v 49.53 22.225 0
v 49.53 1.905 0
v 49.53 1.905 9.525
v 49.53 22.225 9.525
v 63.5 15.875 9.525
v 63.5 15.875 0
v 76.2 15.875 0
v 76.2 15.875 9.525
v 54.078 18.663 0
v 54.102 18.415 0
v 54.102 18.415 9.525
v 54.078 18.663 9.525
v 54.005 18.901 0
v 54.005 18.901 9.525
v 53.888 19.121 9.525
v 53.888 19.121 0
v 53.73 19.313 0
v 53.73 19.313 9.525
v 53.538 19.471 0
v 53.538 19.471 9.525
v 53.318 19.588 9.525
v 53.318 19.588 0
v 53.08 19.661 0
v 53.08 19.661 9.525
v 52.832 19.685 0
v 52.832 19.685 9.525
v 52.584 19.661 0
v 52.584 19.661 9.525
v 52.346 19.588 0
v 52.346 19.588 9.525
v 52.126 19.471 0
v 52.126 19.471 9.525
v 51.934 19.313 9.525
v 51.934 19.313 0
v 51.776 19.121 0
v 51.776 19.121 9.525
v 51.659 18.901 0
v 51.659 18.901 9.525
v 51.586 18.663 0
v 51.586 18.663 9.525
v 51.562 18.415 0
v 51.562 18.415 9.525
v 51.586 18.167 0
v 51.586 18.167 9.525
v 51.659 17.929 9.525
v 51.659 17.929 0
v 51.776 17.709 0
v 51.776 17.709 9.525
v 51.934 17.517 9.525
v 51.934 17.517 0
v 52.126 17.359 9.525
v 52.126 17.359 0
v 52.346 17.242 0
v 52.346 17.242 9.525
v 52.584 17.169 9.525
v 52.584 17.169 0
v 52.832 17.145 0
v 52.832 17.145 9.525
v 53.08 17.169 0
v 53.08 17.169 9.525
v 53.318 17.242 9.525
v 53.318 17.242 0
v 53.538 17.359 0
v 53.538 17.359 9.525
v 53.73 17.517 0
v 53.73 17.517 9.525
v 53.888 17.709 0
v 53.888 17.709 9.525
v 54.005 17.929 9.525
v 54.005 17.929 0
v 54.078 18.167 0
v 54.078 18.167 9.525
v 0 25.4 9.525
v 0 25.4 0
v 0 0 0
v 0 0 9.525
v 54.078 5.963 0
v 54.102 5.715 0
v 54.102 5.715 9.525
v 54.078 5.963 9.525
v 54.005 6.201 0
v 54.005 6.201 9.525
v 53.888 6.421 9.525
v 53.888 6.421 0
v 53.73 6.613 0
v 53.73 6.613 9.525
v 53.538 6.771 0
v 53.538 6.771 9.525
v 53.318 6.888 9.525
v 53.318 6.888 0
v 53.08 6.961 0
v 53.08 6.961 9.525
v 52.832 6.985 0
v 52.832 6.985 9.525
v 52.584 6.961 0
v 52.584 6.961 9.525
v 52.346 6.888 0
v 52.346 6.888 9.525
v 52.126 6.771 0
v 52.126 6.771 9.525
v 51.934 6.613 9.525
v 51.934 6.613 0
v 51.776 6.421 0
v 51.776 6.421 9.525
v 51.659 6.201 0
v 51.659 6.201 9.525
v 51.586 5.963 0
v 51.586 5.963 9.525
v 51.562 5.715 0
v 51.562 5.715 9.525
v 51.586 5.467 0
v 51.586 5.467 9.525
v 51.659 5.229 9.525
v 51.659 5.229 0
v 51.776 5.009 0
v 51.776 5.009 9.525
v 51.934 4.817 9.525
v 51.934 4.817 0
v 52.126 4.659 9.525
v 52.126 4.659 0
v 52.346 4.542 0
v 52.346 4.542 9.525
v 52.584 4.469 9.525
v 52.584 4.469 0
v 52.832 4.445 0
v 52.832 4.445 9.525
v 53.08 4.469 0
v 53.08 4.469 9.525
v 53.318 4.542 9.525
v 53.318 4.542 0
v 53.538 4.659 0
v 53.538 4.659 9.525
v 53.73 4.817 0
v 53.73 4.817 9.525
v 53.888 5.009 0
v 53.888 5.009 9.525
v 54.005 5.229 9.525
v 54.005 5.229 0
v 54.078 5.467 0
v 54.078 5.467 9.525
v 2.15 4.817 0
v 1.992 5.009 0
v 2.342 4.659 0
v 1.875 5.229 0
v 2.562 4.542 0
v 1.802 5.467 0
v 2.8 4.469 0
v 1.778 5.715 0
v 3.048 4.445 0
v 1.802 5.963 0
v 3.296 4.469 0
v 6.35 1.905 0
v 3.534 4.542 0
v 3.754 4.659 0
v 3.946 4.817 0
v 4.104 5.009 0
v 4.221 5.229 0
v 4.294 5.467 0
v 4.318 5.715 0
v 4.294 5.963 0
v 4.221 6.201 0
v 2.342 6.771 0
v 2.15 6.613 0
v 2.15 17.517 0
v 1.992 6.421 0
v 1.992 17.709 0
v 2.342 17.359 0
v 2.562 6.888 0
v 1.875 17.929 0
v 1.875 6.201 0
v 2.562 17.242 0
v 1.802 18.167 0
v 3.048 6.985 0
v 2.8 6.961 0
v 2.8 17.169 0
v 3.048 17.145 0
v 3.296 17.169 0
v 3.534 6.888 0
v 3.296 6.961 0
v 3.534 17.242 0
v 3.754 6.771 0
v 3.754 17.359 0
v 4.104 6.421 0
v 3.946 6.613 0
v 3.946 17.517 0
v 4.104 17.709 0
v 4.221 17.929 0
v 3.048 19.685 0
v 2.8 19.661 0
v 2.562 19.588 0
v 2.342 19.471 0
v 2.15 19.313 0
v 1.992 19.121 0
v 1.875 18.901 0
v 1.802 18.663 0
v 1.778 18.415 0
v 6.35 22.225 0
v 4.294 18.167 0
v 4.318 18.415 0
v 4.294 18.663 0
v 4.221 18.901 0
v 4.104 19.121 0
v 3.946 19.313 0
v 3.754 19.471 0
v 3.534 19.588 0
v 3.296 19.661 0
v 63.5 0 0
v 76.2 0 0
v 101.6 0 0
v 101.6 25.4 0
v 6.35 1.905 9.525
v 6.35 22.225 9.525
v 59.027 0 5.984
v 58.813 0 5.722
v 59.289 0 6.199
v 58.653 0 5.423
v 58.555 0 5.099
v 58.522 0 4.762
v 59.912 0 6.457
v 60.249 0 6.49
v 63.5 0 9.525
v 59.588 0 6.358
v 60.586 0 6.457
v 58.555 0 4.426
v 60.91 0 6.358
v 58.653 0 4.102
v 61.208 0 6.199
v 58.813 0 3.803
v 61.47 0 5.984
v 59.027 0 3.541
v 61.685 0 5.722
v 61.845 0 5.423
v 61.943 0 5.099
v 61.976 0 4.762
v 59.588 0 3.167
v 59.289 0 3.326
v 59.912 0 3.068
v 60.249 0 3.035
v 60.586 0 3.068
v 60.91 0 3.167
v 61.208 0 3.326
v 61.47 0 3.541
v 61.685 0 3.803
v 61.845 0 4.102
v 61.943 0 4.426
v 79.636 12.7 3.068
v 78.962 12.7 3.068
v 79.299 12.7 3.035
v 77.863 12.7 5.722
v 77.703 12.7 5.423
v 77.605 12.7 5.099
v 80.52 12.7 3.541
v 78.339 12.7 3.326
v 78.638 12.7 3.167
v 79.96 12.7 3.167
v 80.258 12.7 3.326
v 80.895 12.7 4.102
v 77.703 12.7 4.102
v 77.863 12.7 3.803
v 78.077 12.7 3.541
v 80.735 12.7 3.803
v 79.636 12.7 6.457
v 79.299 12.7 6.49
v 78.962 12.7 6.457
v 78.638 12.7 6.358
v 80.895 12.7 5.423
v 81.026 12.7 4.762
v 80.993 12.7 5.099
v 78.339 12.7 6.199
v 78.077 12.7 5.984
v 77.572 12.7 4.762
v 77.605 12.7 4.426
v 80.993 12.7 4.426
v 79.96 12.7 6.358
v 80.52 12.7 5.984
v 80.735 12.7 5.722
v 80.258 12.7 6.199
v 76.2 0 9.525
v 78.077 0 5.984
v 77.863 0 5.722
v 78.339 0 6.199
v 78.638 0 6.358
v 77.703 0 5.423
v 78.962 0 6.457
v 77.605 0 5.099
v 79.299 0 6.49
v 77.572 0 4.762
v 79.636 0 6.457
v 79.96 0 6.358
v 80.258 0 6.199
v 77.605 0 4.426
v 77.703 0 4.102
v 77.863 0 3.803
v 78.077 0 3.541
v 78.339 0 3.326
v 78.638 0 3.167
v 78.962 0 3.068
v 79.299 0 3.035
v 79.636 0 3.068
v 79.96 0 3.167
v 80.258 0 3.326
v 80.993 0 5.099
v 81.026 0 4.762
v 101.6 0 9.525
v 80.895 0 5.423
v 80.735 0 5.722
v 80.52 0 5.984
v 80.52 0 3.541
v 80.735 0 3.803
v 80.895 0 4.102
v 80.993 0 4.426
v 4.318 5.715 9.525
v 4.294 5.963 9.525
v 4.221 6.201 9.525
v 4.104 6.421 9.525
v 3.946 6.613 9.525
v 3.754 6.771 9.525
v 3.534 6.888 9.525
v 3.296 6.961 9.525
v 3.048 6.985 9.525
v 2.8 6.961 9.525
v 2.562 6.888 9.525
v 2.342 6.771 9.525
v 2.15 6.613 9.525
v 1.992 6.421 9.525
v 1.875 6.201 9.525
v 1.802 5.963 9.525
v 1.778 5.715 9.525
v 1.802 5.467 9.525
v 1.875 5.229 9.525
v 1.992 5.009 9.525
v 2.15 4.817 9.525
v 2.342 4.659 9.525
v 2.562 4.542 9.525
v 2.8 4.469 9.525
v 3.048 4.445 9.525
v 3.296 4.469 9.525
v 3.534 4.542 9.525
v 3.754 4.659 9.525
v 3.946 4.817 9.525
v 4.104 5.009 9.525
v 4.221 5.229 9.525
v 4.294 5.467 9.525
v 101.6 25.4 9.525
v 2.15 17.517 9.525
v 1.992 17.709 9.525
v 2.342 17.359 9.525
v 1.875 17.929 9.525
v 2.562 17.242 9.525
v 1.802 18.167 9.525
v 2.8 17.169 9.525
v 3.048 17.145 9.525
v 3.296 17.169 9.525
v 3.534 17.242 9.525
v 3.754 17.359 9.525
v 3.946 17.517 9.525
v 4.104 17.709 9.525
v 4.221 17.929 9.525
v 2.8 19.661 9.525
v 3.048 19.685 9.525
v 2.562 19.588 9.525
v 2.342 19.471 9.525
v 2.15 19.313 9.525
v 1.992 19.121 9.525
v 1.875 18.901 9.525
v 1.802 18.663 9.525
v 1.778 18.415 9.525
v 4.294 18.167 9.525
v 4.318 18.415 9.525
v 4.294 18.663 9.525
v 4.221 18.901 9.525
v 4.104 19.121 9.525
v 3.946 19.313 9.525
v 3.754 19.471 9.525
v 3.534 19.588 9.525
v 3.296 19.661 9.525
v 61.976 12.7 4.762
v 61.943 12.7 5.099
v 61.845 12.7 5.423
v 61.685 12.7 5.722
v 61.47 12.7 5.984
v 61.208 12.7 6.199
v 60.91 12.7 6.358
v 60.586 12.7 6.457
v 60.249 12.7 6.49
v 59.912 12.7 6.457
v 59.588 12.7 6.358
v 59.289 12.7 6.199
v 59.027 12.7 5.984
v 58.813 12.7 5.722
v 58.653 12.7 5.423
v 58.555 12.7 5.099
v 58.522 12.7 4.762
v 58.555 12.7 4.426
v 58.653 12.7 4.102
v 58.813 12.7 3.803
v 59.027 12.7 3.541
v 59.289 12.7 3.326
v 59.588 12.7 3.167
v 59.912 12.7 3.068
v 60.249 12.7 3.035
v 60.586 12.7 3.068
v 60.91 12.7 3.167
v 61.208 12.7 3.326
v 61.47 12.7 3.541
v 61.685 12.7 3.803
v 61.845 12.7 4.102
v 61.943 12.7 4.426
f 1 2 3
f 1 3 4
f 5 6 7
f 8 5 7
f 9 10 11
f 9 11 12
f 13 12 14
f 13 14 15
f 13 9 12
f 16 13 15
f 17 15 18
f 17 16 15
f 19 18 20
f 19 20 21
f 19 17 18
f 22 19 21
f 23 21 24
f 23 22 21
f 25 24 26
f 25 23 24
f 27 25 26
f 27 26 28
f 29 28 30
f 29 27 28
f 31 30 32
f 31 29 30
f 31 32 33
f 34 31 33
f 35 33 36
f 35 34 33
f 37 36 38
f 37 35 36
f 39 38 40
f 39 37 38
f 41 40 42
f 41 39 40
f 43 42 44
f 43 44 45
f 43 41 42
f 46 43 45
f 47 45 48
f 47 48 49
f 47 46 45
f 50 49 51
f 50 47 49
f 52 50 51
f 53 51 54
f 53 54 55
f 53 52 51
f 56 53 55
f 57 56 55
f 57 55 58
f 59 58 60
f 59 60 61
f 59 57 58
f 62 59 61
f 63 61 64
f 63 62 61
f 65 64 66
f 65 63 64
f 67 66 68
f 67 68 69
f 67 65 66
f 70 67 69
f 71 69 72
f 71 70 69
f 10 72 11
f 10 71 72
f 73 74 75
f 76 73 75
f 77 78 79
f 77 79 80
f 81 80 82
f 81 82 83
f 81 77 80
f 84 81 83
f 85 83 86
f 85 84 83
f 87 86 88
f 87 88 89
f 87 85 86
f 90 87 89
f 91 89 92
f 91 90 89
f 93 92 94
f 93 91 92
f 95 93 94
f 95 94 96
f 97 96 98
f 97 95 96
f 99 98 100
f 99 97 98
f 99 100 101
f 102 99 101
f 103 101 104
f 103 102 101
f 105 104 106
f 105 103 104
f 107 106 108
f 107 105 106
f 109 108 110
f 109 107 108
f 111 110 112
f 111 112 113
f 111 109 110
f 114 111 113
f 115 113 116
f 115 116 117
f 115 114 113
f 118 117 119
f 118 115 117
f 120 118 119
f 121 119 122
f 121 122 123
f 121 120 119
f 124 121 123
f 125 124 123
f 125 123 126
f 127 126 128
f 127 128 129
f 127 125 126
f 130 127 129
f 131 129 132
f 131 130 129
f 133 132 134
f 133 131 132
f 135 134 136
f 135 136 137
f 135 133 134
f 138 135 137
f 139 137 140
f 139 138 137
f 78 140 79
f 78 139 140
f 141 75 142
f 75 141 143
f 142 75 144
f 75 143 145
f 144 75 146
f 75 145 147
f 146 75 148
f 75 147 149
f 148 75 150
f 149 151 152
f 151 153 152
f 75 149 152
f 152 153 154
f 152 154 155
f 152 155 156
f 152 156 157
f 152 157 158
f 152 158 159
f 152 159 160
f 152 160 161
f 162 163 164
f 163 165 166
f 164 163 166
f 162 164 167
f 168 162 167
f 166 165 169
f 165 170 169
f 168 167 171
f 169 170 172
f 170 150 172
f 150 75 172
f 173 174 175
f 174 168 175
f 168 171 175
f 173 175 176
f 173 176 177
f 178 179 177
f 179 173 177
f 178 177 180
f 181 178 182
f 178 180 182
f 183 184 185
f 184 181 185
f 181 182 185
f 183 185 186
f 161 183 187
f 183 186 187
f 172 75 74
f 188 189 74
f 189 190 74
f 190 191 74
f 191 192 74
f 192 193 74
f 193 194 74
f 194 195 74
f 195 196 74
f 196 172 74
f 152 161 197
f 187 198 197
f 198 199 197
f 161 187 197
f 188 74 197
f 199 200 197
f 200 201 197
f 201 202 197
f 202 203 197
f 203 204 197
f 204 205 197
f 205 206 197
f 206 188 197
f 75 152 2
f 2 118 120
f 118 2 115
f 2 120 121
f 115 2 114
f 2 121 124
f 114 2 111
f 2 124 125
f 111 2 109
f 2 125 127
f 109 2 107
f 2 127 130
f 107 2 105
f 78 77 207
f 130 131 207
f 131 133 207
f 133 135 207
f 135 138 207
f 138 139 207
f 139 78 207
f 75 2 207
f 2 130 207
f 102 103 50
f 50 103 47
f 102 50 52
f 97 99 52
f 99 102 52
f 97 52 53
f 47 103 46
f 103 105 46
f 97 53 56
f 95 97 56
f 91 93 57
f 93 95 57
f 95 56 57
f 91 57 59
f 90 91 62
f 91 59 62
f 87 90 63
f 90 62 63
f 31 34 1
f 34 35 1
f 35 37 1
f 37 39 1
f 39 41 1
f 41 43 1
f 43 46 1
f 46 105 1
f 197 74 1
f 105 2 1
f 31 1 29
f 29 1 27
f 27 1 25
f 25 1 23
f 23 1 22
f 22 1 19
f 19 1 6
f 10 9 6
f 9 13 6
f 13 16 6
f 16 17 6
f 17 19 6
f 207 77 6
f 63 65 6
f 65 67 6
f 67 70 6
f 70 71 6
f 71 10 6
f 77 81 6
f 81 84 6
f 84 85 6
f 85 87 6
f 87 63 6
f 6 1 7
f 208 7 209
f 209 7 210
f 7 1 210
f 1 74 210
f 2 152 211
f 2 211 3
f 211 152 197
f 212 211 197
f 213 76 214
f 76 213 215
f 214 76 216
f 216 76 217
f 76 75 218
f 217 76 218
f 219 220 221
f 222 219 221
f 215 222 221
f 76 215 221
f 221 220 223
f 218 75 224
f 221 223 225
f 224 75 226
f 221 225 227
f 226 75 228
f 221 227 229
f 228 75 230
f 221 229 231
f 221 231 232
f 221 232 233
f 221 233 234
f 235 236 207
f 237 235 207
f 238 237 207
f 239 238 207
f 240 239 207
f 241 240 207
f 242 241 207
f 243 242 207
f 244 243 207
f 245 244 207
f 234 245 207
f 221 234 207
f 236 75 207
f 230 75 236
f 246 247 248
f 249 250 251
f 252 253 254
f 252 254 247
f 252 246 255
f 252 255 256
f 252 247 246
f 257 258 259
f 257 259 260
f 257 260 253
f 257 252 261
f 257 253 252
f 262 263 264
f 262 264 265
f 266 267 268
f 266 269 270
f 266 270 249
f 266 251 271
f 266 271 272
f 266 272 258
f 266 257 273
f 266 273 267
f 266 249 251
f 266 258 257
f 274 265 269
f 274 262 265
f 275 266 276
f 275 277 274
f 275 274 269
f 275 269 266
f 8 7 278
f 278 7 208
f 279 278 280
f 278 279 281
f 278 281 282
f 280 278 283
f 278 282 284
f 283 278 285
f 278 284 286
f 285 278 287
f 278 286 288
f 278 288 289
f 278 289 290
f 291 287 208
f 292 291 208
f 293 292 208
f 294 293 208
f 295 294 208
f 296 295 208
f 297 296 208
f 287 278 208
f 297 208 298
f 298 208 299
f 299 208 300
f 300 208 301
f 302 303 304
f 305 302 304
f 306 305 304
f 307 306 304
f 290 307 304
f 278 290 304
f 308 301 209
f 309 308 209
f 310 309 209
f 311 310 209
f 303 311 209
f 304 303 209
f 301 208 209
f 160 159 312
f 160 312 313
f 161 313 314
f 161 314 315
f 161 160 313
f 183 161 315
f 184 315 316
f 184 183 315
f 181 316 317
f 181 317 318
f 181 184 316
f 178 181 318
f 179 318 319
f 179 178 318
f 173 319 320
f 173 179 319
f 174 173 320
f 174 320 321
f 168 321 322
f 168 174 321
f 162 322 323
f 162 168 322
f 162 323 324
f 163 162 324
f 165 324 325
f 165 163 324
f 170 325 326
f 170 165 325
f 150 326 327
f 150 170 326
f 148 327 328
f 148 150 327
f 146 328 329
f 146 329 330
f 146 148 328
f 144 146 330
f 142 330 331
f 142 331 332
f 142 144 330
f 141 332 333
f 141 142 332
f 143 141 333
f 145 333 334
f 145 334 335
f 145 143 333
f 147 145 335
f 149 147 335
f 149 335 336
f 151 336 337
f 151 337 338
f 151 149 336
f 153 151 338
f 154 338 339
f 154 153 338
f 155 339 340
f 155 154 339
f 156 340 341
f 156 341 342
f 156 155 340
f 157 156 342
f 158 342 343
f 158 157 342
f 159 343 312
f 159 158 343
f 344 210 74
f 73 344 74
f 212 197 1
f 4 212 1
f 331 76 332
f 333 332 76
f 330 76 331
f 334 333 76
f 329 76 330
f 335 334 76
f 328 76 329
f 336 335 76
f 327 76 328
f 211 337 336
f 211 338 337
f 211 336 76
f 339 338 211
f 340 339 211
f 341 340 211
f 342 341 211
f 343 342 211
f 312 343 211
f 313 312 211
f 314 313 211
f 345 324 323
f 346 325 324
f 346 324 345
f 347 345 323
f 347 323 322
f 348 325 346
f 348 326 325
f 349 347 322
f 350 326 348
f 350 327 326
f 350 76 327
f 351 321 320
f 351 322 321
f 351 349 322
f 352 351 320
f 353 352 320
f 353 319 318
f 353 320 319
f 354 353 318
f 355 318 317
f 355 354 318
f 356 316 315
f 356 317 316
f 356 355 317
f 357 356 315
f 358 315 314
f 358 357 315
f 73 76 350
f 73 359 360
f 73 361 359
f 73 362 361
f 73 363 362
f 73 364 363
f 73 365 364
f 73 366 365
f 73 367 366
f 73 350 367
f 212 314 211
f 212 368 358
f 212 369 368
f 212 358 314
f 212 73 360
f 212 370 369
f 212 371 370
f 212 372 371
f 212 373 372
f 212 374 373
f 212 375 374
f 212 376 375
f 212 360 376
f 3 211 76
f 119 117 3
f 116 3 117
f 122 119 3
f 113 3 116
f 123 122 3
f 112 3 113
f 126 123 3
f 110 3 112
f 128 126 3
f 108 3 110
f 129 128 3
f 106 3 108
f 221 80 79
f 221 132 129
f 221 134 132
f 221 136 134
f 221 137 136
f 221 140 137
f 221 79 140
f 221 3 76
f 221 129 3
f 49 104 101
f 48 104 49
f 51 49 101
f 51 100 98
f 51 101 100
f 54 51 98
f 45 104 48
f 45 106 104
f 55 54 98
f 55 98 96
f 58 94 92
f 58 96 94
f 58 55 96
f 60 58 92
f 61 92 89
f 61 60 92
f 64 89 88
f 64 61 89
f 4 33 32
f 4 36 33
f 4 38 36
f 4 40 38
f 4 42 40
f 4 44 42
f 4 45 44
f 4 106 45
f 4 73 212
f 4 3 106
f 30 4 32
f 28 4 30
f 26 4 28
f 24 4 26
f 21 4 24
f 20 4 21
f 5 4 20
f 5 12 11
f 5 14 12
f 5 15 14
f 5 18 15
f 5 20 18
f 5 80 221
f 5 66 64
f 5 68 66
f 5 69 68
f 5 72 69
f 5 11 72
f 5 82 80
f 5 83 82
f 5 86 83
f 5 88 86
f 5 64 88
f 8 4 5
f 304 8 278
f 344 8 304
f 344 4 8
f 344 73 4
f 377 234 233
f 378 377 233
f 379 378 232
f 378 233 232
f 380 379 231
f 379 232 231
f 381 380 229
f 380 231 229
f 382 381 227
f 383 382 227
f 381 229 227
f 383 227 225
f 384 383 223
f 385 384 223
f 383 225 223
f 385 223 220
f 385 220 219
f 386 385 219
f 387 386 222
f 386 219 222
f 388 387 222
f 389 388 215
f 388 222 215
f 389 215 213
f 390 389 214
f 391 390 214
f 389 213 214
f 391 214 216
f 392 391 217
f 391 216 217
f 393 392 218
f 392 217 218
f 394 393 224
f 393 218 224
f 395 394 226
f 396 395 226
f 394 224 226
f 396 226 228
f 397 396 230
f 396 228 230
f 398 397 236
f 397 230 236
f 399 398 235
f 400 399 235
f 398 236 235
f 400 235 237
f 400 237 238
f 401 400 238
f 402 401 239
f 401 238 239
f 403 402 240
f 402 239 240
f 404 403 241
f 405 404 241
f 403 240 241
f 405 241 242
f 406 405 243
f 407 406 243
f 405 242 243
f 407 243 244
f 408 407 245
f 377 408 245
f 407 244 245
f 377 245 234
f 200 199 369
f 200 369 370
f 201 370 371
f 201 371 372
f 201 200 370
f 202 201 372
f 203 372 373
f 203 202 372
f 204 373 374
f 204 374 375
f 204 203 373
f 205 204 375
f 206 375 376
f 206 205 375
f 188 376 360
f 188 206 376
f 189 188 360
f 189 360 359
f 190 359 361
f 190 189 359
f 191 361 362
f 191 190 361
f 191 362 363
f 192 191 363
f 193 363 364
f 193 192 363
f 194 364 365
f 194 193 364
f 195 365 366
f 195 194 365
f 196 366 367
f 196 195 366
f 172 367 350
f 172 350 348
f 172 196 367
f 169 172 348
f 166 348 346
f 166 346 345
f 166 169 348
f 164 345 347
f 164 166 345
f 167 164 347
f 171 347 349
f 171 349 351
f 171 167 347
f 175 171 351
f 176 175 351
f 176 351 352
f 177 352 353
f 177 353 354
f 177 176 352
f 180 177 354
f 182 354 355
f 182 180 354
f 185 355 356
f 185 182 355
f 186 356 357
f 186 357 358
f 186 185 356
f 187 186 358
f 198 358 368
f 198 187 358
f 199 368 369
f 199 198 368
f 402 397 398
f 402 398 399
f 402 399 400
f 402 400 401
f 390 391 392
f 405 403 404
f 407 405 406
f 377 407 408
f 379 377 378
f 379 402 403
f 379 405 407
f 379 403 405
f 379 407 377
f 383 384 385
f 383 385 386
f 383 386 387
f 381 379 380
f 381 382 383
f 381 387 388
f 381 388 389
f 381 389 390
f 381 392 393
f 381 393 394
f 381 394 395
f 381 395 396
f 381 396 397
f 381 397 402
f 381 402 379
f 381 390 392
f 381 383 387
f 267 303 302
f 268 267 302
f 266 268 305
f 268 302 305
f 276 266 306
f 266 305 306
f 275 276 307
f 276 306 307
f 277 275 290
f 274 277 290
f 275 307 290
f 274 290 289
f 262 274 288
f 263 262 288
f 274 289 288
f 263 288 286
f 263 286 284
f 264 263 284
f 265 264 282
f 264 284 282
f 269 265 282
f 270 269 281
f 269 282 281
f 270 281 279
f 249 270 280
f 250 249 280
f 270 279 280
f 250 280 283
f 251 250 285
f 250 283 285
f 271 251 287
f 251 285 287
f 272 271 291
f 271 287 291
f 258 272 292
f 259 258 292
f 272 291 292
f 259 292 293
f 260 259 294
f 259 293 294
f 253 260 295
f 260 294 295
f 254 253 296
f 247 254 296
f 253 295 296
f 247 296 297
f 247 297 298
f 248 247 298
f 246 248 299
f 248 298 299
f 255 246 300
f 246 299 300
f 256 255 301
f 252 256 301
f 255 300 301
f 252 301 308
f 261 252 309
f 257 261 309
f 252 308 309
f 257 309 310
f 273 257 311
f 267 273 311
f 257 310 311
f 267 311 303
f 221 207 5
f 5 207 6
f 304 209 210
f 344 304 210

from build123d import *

# Parameters (mm, degrees)
SKETCH1_R           = 1.27
SKETCH1_W           = 43.18
SKETCH1_H           = 20.32
BOSS_EXTRUDE1_DEPTH = 9.525
SKETCH2_R           = 1.7272
CUT_EXTRUDE1_DEPTH  = 12.7


with BuildPart() as part:
    # Sketch1 → Boss-Extrude1 (new body)
    with BuildSketch(Plane.XY):
        Polygon((0, 0), (63.5, 0), (63.5, 15.875), (76.2, 15.875), (76.2, 0), (101.6, 0), (101.6, 25.4), (0, 25.4), align=None)
        with Locations((3.048, 18.415)):
            Circle(SKETCH1_R, mode=Mode.SUBTRACT)
        with Locations((3.048, 5.715)):
            Circle(SKETCH1_R, mode=Mode.SUBTRACT)
        with Locations((52.832, 18.415)):
            Circle(SKETCH1_R, mode=Mode.SUBTRACT)
        with Locations((52.832, 5.715)):
            Circle(SKETCH1_R, mode=Mode.SUBTRACT)
        with Locations((27.94, 12.065)):
            Rectangle(SKETCH1_W, SKETCH1_H, mode=Mode.SUBTRACT)
    extrude(amount=BOSS_EXTRUDE1_DEPTH)

    # Sketch2 → Cut-Extrude1 (cut)
    with BuildSketch(Plane.XZ):
        with Locations((60.2488, 4.7625)):
            Circle(SKETCH2_R)
        with Locations((79.2988, 4.7625)):
            Circle(SKETCH2_R)
    extrude(amount=-CUT_EXTRUDE1_DEPTH, mode=Mode.SUBTRACT)


solid = part.part
